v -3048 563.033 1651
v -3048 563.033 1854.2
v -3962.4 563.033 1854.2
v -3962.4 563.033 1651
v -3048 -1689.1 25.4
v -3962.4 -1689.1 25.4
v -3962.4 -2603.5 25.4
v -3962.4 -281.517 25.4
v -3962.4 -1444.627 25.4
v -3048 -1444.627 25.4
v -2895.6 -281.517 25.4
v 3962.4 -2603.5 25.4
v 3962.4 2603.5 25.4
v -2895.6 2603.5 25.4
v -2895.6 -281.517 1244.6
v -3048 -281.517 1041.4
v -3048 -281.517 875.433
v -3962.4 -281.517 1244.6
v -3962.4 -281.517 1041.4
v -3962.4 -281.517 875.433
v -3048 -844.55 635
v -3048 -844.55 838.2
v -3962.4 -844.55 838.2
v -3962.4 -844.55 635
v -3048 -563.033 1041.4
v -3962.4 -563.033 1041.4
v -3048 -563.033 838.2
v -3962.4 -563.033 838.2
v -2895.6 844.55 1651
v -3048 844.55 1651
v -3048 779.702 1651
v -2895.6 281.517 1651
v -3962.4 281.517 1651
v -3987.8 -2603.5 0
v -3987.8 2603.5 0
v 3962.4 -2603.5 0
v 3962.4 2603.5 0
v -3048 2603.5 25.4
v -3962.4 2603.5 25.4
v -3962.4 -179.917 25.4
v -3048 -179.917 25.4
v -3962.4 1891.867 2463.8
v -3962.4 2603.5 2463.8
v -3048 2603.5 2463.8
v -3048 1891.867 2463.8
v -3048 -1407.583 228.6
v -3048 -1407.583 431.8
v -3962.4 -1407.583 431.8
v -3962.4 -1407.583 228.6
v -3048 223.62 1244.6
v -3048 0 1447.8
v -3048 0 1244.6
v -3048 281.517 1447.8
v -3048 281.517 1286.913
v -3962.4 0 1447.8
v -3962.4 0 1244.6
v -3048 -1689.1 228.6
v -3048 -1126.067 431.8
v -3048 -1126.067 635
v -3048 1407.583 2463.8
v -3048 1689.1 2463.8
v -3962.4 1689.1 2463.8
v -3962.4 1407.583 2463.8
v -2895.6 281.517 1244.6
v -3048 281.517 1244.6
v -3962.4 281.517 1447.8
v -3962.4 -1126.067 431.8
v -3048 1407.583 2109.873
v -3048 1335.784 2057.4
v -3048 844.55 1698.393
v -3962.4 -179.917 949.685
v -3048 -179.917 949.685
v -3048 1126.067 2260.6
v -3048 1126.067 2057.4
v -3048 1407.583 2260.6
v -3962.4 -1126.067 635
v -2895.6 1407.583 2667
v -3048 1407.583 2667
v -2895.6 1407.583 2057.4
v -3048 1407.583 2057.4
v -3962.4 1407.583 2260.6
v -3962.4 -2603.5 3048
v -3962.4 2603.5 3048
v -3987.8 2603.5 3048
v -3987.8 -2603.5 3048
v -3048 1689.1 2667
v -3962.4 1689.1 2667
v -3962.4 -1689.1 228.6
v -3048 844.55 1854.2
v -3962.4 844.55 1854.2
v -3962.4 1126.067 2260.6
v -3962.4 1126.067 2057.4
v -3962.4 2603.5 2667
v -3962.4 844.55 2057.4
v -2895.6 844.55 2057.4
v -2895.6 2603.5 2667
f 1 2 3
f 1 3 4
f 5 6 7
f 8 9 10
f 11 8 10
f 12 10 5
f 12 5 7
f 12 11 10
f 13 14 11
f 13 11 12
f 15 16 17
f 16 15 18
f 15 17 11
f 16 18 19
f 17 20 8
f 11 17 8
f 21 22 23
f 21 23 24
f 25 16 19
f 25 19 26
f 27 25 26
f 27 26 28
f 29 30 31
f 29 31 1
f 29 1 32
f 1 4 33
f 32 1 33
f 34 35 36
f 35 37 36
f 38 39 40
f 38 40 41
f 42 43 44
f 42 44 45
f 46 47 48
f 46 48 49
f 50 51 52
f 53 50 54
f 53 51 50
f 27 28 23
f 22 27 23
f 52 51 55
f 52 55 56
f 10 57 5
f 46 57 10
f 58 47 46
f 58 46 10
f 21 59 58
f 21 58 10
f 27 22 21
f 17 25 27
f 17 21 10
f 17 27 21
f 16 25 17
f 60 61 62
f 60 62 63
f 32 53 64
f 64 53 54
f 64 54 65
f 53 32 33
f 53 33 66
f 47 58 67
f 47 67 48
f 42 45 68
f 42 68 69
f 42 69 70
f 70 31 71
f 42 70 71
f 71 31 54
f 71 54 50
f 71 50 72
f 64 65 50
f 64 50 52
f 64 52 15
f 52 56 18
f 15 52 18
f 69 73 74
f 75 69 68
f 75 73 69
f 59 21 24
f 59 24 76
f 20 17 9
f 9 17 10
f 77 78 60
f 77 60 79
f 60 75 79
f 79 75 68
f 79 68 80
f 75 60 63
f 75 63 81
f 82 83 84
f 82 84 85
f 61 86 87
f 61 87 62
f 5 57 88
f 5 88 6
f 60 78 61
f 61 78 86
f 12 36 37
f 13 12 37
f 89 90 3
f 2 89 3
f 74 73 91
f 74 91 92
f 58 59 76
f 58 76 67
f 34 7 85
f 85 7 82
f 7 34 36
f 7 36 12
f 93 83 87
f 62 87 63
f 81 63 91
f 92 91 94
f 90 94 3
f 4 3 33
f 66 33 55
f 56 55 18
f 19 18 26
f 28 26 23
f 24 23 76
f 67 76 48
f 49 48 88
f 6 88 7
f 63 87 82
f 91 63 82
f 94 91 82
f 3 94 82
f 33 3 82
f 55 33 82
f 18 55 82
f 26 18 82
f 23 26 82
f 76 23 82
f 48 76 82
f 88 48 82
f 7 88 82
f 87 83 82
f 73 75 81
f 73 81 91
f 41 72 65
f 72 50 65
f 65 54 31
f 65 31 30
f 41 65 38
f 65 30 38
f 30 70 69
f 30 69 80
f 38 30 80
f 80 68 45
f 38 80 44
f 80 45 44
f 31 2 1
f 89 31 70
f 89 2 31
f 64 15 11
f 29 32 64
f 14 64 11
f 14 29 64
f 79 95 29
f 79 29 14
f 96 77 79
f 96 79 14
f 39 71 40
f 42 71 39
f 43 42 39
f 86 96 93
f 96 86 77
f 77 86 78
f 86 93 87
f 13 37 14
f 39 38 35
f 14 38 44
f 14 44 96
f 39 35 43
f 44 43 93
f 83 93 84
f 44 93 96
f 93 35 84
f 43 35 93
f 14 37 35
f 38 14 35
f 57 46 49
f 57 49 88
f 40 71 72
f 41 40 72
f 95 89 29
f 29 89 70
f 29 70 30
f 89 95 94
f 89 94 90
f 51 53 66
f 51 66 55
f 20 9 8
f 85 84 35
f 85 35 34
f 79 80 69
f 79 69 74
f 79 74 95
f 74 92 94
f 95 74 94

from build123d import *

# Parameters (mm, degrees)
F0_W     = 7924.8
F0_H     = 5207
F1_DEPTH = 25.4
F2_W     = 5207
F2_H     = 3048
F3_DEPTH = 25.4
F5_DEPTH = 914.4
F7_DEPTH = 914.4
F9_DEPTH = 152.4
F10_W    = 914.4
F10_H    = 101.6


with BuildPart() as f1:
    # F0 (on Top) → F1 (new body)
    with BuildSketch(Plane.XY):
        Rectangle(F0_W, F0_H)
    extrude(amount=F1_DEPTH)

    # F2 (on face) → F3 (join)
    with BuildSketch(Plane(origin=(-3962.4, 0, 0), x_dir=(0, -1, 0), z_dir=(-1, 0, 0))):
        with Locations((0, 1524)):
            Rectangle(F2_W, F2_H)
    extrude(amount=F3_DEPTH)

    # F4 (on face) → F5 (join)
    with BuildSketch(Plane.YZ.offset(-3962.4)):
        Polygon((-1689.1, 228.6), (-1689.1, 25.4), (2603.5, 25.4), (2603.5, 2667), (1689.1, 2667), (1689.1, 2463.8), (1407.5833333333, 2463.8), (1407.5833333333, 2260.6), (1126.0666666667, 2260.6), (1126.0666666667, 2057.4), (844.55, 2057.4), (844.55, 1854.2), (563.0333333333, 1854.2), (563.0333333333, 1651), (281.5166666667, 1651), (281.5166666667, 1447.8), (0, 1447.8), (0, 1244.6), (-281.5166666667, 1244.6), (-281.5166666667, 1041.4), (-563.0333333333, 1041.4), (-563.0333333333, 838.2), (-844.55, 838.2), (-844.55, 635), (-1126.0666666667, 635), (-1126.0666666667, 431.8), (-1407.5833333333, 431.8), (-1407.5833333333, 228.6), align=None)
    extrude(amount=F5_DEPTH)

    # F6 (on face) → F7 (cut, through all)
    with BuildSketch(Plane.YZ.offset(-3048)):
        Polygon((2603.5, 25.4), (2603.5, 2463.8), (1891.8667649631, 2463.8), (-1444.6270621974, 25.4), align=None)
    extrude(amount=-F7_DEPTH, mode=Mode.SUBTRACT)

    # F8 (on face) → F9 (join)
    with BuildSketch(Plane.YZ.offset(-3048)):
        Polygon((2603.5, 25.4), (2603.5, 2667), (1407.5833333333, 2667), (1407.5833333333, 2057.4), (844.55, 2057.4), (844.55, 1651), (281.5166666667, 1651), (281.5166666667, 1244.6), (-281.5166666667, 1244.6), (-281.5166666667, 25.4), align=None)
    extrude(amount=F9_DEPTH)

    # F10 (on face) → F11 (join, up to the next surface of F1)
    with BuildSketch(Plane.XY.offset(25.4)):
        with Locations((-3505.2, -230.7166666667)):
            Rectangle(F10_W, F10_H)
    extrude(until=Until.NEXT)


solid = f1.part
